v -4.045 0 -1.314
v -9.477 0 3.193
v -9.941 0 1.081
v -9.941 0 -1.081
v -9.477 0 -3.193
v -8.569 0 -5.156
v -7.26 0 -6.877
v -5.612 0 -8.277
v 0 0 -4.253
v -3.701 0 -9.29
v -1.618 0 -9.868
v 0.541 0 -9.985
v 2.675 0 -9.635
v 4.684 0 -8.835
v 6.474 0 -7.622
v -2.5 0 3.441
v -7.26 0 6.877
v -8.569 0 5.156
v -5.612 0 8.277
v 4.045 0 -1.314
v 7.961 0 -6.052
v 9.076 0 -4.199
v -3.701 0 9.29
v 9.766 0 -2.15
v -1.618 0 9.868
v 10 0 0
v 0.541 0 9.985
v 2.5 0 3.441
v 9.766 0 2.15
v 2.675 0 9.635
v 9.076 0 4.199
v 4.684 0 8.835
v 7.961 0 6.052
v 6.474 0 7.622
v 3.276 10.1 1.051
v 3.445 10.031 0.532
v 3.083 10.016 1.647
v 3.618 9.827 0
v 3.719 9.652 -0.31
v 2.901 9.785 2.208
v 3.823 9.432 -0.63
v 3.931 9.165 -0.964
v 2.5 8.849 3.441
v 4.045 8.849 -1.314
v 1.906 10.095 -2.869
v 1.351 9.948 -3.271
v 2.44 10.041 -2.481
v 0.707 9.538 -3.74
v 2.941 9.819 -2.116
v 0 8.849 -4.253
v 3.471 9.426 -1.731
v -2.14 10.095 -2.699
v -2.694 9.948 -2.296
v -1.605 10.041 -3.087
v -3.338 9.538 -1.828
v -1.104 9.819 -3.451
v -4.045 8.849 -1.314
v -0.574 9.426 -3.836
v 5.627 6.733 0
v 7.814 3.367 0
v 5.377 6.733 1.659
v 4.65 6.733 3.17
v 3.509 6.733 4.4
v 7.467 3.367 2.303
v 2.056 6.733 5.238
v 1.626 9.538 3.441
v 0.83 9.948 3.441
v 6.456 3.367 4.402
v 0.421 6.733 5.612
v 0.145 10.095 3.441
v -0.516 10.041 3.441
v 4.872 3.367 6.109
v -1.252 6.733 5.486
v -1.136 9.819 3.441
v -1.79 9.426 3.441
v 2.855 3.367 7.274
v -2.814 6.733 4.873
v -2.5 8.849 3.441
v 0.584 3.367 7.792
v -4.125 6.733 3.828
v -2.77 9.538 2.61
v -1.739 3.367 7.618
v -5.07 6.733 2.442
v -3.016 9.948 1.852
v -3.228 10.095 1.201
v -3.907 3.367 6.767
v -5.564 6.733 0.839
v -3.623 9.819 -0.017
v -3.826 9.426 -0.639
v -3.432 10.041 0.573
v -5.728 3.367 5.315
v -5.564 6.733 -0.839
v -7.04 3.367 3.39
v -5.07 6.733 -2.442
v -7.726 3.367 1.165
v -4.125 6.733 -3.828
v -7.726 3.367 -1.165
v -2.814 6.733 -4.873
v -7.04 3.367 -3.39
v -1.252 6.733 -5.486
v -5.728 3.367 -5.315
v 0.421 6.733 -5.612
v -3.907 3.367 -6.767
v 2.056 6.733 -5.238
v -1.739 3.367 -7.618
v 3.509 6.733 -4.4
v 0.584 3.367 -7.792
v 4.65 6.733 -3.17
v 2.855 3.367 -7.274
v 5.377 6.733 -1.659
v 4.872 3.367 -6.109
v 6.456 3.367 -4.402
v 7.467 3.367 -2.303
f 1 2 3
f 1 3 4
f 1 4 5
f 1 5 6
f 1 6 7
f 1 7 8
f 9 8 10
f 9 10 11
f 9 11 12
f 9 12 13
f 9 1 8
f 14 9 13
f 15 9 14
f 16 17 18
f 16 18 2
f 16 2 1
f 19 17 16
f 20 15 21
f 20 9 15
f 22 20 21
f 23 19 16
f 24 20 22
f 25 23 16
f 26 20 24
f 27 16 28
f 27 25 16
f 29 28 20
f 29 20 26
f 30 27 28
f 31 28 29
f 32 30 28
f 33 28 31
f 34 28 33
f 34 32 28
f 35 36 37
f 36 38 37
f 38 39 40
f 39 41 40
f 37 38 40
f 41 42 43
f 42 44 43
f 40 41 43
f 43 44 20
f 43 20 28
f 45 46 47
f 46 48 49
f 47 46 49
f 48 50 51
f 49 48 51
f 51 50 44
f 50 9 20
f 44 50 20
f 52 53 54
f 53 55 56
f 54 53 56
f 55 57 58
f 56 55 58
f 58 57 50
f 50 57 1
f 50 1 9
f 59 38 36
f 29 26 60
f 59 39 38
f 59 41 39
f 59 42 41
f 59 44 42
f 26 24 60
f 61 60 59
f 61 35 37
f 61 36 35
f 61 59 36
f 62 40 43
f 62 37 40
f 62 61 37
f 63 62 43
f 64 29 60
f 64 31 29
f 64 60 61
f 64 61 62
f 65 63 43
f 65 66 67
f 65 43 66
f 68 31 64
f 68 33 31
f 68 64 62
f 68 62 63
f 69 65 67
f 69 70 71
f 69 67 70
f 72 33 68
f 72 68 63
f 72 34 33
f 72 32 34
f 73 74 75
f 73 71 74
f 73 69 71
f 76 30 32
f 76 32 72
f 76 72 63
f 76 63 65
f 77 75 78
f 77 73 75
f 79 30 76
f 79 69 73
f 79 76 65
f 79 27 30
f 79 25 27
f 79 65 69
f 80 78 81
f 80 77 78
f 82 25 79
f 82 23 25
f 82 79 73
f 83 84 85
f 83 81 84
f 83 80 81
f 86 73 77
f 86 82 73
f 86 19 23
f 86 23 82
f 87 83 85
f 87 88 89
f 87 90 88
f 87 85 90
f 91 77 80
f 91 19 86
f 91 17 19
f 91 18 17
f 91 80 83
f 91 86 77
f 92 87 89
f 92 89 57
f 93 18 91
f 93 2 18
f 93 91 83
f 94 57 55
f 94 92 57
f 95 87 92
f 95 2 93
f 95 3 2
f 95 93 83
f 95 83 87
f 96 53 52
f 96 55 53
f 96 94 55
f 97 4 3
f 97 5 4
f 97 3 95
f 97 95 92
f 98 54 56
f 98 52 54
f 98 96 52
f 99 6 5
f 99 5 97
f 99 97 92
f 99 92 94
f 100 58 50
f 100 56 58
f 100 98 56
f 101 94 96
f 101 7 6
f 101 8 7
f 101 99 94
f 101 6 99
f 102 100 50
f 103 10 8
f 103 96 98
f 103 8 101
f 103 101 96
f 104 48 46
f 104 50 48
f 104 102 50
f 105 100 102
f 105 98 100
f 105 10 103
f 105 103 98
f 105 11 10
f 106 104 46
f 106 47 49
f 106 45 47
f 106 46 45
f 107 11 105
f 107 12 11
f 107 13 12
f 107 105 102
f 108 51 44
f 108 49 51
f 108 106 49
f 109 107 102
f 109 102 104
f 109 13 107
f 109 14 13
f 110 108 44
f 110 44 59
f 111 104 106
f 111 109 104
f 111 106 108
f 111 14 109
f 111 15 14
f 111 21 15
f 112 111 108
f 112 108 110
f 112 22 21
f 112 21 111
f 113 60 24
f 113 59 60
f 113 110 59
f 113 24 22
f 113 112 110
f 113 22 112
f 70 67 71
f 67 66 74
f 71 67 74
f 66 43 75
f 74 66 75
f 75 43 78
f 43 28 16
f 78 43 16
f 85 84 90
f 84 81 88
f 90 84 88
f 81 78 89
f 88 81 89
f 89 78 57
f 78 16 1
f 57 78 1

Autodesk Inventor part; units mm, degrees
ref_plane "YZ Plane" through (0, 0, 0) normal (1, 0, 0) x (0, 1, 0)
ref_plane "XZ Plane" through (0, 0, 0) normal (0, 1, 0) x (-1, 0, 0)
ref_plane "XY Plane" through (0, 0, 0) normal (0, 0, 1) x (1, 0, 0)
sketch "Эскиз1" plane through (0, 0, 0) normal (0, 0, 1) x (1, 0, 0)
  line L0 (0, 0) -> (10, 0)
  line L1 (10, 0) -> (0, 15.3986)
  line L2 (0, 15.3986) -> (0, 0)
  dimension "d0" = 10
  dimension "d1" = 57
revolve "Вращение1" add sketch "Эскиз1" angle 360 about axis through (0, 15.3986, 0) along (0, -1, 0)
sketch "Эскиз2" plane through (0, 0, 0) normal (0, 1, 0) x (-1, 0, 0)
  line L0 (0, -4.2533) -> (-4.0451, -1.3143)
  line L1 (-4.0451, -1.3143) -> (-2.5, 3.441)
  line L2 (-2.5, 3.441) -> (2.5, 3.441)
  line L3 (2.5, 3.441) -> (4.0451, -1.3143)
  line L4 (4.0451, -1.3143) -> (0, -4.2533)
  point P0 (0, 0)
  point P1 (0, 0)
  dimension "d3" = 5
extrude "Выдавливание1" cut sketch "Эскиз2" along normal blind 40
properties part number "1"
